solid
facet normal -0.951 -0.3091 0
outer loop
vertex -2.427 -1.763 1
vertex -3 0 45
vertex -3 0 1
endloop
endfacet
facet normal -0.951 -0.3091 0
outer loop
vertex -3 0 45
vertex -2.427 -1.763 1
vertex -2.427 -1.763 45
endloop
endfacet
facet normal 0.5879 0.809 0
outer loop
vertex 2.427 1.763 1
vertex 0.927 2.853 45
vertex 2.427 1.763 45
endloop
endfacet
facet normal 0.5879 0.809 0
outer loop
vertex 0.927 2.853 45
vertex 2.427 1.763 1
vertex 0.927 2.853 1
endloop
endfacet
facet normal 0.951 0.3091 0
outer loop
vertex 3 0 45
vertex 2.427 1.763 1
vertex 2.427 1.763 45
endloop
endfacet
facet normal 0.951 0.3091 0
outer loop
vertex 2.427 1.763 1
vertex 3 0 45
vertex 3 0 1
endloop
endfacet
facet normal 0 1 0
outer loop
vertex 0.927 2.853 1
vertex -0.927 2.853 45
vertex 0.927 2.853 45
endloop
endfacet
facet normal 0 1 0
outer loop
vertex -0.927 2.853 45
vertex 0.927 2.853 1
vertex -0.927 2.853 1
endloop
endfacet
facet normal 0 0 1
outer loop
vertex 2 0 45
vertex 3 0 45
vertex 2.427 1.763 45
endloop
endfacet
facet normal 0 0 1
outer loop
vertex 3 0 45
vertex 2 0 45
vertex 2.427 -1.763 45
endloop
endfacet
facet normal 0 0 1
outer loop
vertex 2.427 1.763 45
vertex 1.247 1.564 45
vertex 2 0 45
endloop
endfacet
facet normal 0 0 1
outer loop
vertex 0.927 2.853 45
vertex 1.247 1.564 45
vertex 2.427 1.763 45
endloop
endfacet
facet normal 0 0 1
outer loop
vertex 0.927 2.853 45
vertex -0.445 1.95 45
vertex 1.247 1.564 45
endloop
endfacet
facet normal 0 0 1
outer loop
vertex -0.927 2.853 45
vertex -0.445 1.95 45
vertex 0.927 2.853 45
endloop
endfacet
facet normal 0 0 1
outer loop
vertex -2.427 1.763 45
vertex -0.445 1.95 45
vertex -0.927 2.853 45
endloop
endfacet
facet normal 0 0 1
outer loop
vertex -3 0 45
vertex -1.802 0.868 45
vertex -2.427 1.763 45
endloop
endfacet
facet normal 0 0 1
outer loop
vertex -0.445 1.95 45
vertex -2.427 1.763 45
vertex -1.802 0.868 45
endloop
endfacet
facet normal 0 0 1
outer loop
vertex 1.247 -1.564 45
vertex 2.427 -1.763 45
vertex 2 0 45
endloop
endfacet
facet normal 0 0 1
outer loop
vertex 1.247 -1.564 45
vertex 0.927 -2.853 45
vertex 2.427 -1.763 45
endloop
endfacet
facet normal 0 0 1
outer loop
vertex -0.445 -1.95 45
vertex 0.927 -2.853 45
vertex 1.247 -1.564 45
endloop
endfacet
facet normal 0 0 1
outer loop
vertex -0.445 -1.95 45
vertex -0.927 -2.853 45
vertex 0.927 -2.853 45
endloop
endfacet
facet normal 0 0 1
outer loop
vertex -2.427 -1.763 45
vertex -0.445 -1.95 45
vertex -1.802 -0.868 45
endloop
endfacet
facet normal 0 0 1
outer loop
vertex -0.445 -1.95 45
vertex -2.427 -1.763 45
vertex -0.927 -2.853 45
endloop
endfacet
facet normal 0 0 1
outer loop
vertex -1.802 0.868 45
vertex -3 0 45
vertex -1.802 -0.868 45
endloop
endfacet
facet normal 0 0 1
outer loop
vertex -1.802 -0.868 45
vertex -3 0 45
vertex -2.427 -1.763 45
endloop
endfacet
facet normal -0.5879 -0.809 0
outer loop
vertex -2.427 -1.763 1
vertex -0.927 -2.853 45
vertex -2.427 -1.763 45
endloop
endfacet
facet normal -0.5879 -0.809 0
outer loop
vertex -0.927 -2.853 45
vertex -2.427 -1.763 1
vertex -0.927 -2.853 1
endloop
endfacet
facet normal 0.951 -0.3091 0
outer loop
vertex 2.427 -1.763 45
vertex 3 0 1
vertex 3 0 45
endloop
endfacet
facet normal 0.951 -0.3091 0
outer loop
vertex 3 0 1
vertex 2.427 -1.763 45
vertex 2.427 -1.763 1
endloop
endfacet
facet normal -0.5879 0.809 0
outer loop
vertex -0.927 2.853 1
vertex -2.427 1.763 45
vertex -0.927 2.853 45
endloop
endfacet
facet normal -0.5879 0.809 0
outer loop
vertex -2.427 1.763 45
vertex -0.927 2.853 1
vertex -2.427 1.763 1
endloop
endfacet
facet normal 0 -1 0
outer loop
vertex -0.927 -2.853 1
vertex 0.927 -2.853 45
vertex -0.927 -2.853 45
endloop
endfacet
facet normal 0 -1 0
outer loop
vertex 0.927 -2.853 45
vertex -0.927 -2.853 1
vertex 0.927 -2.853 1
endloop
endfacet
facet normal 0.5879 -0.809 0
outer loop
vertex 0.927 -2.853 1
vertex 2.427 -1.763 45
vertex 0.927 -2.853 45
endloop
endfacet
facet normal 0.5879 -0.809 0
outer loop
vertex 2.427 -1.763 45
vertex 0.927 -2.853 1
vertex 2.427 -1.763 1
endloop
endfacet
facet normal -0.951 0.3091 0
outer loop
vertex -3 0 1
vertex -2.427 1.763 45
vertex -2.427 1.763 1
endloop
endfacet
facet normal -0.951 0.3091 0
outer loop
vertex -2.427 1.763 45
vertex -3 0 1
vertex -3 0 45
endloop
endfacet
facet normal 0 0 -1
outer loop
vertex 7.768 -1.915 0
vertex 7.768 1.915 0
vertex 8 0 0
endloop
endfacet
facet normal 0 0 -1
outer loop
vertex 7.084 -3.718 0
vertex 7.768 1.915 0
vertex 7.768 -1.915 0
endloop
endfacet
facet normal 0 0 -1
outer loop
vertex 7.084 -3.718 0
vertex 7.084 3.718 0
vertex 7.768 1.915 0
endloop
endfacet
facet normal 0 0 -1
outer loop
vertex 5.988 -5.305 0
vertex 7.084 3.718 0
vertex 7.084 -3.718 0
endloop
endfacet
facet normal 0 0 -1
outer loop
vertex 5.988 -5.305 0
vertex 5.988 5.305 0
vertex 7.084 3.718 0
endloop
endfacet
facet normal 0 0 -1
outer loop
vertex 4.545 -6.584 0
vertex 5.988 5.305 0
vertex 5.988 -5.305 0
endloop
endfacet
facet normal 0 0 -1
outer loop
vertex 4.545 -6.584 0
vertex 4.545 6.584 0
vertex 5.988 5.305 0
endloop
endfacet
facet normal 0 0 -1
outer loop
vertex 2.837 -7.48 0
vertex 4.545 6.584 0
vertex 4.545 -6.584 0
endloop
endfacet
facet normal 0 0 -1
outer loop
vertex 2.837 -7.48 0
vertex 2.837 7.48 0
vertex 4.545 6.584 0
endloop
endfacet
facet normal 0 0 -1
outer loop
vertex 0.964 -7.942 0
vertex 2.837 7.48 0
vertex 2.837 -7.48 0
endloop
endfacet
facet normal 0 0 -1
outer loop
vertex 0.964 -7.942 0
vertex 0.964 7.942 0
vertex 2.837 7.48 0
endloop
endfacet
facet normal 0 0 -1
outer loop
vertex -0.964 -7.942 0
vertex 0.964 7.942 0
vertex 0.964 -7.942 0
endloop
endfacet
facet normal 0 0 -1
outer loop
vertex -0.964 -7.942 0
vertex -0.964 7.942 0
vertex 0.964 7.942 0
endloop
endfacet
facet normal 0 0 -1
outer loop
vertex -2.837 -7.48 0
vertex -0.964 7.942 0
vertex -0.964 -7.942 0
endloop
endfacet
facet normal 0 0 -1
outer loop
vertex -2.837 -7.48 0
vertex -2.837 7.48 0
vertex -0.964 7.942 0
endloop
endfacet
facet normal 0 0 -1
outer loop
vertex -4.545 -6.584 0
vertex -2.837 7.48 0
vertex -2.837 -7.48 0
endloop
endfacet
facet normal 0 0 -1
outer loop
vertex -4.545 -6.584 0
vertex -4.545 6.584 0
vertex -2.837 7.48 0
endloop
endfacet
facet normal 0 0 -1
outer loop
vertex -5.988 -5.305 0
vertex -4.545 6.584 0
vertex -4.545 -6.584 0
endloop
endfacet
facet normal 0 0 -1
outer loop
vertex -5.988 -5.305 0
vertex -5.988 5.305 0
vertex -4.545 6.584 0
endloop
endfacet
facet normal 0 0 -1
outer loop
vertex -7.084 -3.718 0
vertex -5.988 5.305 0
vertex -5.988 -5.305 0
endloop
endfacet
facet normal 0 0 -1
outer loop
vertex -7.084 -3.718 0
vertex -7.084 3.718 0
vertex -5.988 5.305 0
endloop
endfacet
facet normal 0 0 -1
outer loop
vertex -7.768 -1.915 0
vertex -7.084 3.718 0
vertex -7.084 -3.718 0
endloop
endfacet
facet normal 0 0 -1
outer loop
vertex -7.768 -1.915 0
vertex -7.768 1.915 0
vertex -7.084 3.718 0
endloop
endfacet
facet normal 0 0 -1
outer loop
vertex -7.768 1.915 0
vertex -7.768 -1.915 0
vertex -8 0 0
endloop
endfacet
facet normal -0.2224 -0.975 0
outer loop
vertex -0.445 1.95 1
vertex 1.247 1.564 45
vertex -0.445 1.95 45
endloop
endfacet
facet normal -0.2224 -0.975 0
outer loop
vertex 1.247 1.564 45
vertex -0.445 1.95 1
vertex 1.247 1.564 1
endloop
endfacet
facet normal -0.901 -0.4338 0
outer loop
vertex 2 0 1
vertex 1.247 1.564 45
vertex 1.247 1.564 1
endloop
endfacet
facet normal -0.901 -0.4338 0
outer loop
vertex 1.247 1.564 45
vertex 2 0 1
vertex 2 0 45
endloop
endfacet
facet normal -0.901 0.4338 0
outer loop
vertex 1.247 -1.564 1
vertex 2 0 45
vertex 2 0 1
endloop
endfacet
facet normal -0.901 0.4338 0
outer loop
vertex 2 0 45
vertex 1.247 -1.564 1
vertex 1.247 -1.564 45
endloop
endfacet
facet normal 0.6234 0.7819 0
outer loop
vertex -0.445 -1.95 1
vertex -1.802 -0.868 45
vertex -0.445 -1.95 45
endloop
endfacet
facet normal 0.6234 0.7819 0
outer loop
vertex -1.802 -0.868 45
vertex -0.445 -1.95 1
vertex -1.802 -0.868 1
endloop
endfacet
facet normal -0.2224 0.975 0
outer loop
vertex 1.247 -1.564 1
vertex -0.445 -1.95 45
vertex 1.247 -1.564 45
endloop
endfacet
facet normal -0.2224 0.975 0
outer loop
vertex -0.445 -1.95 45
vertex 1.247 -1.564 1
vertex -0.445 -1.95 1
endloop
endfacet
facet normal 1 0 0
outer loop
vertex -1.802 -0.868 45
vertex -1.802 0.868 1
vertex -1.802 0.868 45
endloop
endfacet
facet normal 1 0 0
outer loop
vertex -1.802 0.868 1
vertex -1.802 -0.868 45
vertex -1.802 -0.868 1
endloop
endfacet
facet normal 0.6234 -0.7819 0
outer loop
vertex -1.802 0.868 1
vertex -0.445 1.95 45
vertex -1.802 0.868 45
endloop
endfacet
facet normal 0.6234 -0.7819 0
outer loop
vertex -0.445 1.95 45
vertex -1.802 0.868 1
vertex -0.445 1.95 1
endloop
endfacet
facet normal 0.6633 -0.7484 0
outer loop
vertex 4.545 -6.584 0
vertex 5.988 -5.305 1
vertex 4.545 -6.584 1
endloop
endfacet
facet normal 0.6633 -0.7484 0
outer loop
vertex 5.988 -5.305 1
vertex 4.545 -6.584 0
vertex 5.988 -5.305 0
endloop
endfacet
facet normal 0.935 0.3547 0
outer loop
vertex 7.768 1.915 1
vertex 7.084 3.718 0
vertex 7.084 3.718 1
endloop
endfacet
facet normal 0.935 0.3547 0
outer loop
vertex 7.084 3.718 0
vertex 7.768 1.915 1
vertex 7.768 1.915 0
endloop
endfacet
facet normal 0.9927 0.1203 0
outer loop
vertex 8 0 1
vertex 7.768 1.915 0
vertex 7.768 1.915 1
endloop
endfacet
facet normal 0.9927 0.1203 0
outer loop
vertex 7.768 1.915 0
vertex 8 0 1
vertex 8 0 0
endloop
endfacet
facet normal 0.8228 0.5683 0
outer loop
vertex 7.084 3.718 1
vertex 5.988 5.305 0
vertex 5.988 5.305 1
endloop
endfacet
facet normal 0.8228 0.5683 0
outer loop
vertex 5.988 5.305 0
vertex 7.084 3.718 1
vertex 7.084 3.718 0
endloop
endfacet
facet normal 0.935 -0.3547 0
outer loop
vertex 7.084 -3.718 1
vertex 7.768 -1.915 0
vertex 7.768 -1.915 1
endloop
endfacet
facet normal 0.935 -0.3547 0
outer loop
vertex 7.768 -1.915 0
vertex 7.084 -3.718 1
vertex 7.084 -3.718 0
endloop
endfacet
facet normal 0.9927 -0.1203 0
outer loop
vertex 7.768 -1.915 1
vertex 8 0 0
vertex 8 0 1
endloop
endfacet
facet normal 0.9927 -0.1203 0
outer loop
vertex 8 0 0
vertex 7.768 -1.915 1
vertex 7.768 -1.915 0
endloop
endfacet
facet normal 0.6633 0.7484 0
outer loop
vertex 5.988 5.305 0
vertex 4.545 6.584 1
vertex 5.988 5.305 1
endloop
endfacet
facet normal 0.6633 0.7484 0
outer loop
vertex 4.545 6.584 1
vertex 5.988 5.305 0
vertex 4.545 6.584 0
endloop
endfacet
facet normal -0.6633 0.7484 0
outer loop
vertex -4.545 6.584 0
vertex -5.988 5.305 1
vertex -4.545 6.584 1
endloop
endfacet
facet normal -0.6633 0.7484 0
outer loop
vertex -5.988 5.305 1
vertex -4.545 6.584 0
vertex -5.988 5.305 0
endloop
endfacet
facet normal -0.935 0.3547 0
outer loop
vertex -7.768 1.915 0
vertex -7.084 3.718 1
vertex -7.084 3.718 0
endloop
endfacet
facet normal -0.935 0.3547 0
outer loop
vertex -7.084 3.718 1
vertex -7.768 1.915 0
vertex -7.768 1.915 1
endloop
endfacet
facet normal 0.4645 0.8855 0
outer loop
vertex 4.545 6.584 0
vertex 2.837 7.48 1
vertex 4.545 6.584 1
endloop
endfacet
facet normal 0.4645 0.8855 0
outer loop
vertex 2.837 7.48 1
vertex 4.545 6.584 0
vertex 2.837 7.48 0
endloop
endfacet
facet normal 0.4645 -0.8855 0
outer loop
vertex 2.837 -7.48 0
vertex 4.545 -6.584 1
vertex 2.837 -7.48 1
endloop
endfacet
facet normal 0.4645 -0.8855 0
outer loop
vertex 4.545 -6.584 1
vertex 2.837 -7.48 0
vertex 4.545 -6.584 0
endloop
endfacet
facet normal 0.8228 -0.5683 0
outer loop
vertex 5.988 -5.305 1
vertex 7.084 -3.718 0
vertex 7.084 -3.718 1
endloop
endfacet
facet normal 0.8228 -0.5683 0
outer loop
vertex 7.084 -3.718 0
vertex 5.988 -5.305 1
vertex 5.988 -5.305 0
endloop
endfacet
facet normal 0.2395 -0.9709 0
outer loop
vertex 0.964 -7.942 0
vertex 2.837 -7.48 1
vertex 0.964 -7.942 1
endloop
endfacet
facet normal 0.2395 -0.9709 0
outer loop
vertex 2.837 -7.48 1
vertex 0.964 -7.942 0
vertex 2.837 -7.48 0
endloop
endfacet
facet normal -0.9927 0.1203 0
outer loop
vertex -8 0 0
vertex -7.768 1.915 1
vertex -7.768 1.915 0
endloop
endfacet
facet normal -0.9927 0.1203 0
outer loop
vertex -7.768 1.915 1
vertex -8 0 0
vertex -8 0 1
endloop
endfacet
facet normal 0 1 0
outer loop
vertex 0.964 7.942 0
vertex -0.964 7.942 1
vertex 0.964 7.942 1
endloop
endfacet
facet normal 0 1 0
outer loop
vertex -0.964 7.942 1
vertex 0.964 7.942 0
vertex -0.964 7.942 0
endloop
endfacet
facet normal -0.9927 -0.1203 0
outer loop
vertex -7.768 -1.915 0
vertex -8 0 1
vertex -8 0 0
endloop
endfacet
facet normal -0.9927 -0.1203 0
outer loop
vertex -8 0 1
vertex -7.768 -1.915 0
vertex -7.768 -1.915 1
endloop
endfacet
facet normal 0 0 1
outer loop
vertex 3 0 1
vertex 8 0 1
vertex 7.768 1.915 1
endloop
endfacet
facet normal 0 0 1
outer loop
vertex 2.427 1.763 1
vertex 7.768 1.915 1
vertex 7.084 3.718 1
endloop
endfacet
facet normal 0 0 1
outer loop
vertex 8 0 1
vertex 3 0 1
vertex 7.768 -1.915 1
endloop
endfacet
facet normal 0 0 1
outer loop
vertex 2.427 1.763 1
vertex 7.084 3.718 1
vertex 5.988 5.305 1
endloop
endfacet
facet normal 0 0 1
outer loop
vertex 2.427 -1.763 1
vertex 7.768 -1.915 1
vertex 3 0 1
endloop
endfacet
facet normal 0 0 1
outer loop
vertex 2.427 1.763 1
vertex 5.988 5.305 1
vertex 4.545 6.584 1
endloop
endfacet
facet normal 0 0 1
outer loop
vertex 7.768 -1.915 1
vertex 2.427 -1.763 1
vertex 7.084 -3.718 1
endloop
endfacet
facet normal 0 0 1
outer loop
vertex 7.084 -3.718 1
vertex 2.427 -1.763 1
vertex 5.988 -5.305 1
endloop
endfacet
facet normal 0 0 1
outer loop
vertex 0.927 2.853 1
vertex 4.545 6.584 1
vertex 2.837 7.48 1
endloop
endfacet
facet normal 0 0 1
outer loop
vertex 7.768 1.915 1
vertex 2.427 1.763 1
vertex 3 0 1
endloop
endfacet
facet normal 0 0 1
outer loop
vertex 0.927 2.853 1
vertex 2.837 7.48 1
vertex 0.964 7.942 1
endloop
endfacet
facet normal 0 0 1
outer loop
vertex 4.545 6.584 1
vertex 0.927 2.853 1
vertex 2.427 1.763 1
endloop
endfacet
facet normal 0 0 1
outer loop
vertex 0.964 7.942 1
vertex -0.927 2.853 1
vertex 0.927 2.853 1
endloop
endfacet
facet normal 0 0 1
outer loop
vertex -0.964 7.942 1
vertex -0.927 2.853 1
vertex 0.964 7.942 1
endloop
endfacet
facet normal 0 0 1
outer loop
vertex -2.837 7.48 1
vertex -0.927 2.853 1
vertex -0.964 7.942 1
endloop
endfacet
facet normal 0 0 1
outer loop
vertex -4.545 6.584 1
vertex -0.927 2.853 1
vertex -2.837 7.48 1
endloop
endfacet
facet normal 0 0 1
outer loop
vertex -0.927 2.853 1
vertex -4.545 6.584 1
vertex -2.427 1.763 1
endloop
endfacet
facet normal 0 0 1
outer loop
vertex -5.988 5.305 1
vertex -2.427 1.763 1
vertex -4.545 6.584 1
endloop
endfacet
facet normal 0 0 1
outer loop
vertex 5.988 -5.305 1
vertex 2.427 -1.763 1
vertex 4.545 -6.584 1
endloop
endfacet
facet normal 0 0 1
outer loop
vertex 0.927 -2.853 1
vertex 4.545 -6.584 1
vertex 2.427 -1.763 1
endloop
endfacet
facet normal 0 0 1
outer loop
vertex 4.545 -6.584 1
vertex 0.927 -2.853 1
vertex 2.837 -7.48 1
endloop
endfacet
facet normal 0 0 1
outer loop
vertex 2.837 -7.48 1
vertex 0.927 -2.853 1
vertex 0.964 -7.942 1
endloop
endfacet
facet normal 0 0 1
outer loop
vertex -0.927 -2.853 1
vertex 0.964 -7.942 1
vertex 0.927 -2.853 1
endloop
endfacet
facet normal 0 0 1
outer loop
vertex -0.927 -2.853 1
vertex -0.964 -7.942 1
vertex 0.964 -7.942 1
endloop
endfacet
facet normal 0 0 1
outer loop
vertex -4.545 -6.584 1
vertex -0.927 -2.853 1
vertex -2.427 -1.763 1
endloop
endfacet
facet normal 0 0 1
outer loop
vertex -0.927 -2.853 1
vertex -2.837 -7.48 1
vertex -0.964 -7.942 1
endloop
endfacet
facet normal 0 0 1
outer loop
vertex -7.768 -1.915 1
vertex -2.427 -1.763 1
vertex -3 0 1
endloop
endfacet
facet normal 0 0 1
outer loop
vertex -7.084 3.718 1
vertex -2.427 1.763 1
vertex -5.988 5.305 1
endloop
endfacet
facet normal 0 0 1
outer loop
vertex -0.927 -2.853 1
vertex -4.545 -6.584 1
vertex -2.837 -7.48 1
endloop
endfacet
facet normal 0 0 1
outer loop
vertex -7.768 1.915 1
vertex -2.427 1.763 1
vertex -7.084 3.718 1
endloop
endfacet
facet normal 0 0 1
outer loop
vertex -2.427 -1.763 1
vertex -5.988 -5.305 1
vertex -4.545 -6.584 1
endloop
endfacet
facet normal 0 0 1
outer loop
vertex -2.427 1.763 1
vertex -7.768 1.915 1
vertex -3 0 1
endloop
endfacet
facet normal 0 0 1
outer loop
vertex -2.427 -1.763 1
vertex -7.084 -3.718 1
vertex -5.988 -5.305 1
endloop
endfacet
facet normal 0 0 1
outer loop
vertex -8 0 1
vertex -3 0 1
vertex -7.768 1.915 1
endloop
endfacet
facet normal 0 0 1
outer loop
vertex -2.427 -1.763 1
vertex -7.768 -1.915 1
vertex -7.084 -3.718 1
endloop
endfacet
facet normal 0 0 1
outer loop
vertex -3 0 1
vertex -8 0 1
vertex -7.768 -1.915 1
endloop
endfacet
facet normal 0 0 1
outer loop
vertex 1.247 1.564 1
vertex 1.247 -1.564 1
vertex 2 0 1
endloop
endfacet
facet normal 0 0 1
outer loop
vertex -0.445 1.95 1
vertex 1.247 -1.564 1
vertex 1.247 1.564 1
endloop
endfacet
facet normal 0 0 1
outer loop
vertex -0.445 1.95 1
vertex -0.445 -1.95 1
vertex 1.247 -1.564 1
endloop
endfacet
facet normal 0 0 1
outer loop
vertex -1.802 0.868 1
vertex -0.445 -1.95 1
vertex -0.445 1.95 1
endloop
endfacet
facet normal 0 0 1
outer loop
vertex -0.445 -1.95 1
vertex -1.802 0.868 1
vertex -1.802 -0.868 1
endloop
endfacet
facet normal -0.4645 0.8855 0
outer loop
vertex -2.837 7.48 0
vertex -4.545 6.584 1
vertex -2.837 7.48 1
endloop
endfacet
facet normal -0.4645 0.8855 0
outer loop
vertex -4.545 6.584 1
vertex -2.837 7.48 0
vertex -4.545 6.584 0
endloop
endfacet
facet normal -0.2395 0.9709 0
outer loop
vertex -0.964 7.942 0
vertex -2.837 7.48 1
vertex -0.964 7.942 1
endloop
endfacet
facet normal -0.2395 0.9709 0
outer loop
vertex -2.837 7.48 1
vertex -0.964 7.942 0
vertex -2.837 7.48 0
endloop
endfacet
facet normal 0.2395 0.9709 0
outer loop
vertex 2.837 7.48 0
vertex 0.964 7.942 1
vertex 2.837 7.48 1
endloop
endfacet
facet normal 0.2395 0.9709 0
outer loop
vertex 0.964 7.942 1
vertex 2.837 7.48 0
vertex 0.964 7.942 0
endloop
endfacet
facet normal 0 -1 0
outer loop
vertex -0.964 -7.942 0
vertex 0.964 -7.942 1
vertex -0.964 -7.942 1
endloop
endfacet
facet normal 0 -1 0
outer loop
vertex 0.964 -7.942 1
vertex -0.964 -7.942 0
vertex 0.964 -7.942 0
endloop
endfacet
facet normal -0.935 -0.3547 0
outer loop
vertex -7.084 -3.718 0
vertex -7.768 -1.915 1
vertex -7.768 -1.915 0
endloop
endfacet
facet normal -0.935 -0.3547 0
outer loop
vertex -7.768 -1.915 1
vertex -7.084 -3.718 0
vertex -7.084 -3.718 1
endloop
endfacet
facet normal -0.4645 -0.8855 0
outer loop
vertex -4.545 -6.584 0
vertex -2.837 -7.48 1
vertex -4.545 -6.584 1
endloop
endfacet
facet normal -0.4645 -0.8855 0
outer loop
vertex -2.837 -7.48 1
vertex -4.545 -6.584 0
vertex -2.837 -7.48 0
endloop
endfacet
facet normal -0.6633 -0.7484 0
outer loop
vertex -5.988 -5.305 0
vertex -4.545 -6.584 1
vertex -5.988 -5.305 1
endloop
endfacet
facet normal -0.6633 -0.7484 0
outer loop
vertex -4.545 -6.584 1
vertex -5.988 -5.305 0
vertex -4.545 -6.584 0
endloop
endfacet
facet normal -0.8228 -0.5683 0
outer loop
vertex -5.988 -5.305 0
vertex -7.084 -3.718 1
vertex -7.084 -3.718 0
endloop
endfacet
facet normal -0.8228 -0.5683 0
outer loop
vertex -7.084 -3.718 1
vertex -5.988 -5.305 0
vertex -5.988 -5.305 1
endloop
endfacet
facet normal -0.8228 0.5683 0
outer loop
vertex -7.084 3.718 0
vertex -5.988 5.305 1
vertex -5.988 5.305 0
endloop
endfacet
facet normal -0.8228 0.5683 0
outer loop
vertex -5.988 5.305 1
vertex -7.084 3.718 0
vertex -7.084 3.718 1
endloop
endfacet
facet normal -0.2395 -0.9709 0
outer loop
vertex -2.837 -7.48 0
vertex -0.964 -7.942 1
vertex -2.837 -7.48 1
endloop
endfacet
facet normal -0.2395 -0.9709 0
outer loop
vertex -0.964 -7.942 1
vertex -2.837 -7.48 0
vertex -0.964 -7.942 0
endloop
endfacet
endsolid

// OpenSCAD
WireGuide(3, 2, 45, 8, 1);


module WireGuide(outerRadius, innerRadius, height, topRadius, topHeight) {
        cylinder(h = topHeight, r = topRadius);
        Guide(outerRadius, innerRadius, height);
    
}

module Guide(outerRadius, innerRadius, height) {
    difference() {
        cylinder(h = height, r = outerRadius);
        cylinder(h = height, r = innerRadius);
    }
}
